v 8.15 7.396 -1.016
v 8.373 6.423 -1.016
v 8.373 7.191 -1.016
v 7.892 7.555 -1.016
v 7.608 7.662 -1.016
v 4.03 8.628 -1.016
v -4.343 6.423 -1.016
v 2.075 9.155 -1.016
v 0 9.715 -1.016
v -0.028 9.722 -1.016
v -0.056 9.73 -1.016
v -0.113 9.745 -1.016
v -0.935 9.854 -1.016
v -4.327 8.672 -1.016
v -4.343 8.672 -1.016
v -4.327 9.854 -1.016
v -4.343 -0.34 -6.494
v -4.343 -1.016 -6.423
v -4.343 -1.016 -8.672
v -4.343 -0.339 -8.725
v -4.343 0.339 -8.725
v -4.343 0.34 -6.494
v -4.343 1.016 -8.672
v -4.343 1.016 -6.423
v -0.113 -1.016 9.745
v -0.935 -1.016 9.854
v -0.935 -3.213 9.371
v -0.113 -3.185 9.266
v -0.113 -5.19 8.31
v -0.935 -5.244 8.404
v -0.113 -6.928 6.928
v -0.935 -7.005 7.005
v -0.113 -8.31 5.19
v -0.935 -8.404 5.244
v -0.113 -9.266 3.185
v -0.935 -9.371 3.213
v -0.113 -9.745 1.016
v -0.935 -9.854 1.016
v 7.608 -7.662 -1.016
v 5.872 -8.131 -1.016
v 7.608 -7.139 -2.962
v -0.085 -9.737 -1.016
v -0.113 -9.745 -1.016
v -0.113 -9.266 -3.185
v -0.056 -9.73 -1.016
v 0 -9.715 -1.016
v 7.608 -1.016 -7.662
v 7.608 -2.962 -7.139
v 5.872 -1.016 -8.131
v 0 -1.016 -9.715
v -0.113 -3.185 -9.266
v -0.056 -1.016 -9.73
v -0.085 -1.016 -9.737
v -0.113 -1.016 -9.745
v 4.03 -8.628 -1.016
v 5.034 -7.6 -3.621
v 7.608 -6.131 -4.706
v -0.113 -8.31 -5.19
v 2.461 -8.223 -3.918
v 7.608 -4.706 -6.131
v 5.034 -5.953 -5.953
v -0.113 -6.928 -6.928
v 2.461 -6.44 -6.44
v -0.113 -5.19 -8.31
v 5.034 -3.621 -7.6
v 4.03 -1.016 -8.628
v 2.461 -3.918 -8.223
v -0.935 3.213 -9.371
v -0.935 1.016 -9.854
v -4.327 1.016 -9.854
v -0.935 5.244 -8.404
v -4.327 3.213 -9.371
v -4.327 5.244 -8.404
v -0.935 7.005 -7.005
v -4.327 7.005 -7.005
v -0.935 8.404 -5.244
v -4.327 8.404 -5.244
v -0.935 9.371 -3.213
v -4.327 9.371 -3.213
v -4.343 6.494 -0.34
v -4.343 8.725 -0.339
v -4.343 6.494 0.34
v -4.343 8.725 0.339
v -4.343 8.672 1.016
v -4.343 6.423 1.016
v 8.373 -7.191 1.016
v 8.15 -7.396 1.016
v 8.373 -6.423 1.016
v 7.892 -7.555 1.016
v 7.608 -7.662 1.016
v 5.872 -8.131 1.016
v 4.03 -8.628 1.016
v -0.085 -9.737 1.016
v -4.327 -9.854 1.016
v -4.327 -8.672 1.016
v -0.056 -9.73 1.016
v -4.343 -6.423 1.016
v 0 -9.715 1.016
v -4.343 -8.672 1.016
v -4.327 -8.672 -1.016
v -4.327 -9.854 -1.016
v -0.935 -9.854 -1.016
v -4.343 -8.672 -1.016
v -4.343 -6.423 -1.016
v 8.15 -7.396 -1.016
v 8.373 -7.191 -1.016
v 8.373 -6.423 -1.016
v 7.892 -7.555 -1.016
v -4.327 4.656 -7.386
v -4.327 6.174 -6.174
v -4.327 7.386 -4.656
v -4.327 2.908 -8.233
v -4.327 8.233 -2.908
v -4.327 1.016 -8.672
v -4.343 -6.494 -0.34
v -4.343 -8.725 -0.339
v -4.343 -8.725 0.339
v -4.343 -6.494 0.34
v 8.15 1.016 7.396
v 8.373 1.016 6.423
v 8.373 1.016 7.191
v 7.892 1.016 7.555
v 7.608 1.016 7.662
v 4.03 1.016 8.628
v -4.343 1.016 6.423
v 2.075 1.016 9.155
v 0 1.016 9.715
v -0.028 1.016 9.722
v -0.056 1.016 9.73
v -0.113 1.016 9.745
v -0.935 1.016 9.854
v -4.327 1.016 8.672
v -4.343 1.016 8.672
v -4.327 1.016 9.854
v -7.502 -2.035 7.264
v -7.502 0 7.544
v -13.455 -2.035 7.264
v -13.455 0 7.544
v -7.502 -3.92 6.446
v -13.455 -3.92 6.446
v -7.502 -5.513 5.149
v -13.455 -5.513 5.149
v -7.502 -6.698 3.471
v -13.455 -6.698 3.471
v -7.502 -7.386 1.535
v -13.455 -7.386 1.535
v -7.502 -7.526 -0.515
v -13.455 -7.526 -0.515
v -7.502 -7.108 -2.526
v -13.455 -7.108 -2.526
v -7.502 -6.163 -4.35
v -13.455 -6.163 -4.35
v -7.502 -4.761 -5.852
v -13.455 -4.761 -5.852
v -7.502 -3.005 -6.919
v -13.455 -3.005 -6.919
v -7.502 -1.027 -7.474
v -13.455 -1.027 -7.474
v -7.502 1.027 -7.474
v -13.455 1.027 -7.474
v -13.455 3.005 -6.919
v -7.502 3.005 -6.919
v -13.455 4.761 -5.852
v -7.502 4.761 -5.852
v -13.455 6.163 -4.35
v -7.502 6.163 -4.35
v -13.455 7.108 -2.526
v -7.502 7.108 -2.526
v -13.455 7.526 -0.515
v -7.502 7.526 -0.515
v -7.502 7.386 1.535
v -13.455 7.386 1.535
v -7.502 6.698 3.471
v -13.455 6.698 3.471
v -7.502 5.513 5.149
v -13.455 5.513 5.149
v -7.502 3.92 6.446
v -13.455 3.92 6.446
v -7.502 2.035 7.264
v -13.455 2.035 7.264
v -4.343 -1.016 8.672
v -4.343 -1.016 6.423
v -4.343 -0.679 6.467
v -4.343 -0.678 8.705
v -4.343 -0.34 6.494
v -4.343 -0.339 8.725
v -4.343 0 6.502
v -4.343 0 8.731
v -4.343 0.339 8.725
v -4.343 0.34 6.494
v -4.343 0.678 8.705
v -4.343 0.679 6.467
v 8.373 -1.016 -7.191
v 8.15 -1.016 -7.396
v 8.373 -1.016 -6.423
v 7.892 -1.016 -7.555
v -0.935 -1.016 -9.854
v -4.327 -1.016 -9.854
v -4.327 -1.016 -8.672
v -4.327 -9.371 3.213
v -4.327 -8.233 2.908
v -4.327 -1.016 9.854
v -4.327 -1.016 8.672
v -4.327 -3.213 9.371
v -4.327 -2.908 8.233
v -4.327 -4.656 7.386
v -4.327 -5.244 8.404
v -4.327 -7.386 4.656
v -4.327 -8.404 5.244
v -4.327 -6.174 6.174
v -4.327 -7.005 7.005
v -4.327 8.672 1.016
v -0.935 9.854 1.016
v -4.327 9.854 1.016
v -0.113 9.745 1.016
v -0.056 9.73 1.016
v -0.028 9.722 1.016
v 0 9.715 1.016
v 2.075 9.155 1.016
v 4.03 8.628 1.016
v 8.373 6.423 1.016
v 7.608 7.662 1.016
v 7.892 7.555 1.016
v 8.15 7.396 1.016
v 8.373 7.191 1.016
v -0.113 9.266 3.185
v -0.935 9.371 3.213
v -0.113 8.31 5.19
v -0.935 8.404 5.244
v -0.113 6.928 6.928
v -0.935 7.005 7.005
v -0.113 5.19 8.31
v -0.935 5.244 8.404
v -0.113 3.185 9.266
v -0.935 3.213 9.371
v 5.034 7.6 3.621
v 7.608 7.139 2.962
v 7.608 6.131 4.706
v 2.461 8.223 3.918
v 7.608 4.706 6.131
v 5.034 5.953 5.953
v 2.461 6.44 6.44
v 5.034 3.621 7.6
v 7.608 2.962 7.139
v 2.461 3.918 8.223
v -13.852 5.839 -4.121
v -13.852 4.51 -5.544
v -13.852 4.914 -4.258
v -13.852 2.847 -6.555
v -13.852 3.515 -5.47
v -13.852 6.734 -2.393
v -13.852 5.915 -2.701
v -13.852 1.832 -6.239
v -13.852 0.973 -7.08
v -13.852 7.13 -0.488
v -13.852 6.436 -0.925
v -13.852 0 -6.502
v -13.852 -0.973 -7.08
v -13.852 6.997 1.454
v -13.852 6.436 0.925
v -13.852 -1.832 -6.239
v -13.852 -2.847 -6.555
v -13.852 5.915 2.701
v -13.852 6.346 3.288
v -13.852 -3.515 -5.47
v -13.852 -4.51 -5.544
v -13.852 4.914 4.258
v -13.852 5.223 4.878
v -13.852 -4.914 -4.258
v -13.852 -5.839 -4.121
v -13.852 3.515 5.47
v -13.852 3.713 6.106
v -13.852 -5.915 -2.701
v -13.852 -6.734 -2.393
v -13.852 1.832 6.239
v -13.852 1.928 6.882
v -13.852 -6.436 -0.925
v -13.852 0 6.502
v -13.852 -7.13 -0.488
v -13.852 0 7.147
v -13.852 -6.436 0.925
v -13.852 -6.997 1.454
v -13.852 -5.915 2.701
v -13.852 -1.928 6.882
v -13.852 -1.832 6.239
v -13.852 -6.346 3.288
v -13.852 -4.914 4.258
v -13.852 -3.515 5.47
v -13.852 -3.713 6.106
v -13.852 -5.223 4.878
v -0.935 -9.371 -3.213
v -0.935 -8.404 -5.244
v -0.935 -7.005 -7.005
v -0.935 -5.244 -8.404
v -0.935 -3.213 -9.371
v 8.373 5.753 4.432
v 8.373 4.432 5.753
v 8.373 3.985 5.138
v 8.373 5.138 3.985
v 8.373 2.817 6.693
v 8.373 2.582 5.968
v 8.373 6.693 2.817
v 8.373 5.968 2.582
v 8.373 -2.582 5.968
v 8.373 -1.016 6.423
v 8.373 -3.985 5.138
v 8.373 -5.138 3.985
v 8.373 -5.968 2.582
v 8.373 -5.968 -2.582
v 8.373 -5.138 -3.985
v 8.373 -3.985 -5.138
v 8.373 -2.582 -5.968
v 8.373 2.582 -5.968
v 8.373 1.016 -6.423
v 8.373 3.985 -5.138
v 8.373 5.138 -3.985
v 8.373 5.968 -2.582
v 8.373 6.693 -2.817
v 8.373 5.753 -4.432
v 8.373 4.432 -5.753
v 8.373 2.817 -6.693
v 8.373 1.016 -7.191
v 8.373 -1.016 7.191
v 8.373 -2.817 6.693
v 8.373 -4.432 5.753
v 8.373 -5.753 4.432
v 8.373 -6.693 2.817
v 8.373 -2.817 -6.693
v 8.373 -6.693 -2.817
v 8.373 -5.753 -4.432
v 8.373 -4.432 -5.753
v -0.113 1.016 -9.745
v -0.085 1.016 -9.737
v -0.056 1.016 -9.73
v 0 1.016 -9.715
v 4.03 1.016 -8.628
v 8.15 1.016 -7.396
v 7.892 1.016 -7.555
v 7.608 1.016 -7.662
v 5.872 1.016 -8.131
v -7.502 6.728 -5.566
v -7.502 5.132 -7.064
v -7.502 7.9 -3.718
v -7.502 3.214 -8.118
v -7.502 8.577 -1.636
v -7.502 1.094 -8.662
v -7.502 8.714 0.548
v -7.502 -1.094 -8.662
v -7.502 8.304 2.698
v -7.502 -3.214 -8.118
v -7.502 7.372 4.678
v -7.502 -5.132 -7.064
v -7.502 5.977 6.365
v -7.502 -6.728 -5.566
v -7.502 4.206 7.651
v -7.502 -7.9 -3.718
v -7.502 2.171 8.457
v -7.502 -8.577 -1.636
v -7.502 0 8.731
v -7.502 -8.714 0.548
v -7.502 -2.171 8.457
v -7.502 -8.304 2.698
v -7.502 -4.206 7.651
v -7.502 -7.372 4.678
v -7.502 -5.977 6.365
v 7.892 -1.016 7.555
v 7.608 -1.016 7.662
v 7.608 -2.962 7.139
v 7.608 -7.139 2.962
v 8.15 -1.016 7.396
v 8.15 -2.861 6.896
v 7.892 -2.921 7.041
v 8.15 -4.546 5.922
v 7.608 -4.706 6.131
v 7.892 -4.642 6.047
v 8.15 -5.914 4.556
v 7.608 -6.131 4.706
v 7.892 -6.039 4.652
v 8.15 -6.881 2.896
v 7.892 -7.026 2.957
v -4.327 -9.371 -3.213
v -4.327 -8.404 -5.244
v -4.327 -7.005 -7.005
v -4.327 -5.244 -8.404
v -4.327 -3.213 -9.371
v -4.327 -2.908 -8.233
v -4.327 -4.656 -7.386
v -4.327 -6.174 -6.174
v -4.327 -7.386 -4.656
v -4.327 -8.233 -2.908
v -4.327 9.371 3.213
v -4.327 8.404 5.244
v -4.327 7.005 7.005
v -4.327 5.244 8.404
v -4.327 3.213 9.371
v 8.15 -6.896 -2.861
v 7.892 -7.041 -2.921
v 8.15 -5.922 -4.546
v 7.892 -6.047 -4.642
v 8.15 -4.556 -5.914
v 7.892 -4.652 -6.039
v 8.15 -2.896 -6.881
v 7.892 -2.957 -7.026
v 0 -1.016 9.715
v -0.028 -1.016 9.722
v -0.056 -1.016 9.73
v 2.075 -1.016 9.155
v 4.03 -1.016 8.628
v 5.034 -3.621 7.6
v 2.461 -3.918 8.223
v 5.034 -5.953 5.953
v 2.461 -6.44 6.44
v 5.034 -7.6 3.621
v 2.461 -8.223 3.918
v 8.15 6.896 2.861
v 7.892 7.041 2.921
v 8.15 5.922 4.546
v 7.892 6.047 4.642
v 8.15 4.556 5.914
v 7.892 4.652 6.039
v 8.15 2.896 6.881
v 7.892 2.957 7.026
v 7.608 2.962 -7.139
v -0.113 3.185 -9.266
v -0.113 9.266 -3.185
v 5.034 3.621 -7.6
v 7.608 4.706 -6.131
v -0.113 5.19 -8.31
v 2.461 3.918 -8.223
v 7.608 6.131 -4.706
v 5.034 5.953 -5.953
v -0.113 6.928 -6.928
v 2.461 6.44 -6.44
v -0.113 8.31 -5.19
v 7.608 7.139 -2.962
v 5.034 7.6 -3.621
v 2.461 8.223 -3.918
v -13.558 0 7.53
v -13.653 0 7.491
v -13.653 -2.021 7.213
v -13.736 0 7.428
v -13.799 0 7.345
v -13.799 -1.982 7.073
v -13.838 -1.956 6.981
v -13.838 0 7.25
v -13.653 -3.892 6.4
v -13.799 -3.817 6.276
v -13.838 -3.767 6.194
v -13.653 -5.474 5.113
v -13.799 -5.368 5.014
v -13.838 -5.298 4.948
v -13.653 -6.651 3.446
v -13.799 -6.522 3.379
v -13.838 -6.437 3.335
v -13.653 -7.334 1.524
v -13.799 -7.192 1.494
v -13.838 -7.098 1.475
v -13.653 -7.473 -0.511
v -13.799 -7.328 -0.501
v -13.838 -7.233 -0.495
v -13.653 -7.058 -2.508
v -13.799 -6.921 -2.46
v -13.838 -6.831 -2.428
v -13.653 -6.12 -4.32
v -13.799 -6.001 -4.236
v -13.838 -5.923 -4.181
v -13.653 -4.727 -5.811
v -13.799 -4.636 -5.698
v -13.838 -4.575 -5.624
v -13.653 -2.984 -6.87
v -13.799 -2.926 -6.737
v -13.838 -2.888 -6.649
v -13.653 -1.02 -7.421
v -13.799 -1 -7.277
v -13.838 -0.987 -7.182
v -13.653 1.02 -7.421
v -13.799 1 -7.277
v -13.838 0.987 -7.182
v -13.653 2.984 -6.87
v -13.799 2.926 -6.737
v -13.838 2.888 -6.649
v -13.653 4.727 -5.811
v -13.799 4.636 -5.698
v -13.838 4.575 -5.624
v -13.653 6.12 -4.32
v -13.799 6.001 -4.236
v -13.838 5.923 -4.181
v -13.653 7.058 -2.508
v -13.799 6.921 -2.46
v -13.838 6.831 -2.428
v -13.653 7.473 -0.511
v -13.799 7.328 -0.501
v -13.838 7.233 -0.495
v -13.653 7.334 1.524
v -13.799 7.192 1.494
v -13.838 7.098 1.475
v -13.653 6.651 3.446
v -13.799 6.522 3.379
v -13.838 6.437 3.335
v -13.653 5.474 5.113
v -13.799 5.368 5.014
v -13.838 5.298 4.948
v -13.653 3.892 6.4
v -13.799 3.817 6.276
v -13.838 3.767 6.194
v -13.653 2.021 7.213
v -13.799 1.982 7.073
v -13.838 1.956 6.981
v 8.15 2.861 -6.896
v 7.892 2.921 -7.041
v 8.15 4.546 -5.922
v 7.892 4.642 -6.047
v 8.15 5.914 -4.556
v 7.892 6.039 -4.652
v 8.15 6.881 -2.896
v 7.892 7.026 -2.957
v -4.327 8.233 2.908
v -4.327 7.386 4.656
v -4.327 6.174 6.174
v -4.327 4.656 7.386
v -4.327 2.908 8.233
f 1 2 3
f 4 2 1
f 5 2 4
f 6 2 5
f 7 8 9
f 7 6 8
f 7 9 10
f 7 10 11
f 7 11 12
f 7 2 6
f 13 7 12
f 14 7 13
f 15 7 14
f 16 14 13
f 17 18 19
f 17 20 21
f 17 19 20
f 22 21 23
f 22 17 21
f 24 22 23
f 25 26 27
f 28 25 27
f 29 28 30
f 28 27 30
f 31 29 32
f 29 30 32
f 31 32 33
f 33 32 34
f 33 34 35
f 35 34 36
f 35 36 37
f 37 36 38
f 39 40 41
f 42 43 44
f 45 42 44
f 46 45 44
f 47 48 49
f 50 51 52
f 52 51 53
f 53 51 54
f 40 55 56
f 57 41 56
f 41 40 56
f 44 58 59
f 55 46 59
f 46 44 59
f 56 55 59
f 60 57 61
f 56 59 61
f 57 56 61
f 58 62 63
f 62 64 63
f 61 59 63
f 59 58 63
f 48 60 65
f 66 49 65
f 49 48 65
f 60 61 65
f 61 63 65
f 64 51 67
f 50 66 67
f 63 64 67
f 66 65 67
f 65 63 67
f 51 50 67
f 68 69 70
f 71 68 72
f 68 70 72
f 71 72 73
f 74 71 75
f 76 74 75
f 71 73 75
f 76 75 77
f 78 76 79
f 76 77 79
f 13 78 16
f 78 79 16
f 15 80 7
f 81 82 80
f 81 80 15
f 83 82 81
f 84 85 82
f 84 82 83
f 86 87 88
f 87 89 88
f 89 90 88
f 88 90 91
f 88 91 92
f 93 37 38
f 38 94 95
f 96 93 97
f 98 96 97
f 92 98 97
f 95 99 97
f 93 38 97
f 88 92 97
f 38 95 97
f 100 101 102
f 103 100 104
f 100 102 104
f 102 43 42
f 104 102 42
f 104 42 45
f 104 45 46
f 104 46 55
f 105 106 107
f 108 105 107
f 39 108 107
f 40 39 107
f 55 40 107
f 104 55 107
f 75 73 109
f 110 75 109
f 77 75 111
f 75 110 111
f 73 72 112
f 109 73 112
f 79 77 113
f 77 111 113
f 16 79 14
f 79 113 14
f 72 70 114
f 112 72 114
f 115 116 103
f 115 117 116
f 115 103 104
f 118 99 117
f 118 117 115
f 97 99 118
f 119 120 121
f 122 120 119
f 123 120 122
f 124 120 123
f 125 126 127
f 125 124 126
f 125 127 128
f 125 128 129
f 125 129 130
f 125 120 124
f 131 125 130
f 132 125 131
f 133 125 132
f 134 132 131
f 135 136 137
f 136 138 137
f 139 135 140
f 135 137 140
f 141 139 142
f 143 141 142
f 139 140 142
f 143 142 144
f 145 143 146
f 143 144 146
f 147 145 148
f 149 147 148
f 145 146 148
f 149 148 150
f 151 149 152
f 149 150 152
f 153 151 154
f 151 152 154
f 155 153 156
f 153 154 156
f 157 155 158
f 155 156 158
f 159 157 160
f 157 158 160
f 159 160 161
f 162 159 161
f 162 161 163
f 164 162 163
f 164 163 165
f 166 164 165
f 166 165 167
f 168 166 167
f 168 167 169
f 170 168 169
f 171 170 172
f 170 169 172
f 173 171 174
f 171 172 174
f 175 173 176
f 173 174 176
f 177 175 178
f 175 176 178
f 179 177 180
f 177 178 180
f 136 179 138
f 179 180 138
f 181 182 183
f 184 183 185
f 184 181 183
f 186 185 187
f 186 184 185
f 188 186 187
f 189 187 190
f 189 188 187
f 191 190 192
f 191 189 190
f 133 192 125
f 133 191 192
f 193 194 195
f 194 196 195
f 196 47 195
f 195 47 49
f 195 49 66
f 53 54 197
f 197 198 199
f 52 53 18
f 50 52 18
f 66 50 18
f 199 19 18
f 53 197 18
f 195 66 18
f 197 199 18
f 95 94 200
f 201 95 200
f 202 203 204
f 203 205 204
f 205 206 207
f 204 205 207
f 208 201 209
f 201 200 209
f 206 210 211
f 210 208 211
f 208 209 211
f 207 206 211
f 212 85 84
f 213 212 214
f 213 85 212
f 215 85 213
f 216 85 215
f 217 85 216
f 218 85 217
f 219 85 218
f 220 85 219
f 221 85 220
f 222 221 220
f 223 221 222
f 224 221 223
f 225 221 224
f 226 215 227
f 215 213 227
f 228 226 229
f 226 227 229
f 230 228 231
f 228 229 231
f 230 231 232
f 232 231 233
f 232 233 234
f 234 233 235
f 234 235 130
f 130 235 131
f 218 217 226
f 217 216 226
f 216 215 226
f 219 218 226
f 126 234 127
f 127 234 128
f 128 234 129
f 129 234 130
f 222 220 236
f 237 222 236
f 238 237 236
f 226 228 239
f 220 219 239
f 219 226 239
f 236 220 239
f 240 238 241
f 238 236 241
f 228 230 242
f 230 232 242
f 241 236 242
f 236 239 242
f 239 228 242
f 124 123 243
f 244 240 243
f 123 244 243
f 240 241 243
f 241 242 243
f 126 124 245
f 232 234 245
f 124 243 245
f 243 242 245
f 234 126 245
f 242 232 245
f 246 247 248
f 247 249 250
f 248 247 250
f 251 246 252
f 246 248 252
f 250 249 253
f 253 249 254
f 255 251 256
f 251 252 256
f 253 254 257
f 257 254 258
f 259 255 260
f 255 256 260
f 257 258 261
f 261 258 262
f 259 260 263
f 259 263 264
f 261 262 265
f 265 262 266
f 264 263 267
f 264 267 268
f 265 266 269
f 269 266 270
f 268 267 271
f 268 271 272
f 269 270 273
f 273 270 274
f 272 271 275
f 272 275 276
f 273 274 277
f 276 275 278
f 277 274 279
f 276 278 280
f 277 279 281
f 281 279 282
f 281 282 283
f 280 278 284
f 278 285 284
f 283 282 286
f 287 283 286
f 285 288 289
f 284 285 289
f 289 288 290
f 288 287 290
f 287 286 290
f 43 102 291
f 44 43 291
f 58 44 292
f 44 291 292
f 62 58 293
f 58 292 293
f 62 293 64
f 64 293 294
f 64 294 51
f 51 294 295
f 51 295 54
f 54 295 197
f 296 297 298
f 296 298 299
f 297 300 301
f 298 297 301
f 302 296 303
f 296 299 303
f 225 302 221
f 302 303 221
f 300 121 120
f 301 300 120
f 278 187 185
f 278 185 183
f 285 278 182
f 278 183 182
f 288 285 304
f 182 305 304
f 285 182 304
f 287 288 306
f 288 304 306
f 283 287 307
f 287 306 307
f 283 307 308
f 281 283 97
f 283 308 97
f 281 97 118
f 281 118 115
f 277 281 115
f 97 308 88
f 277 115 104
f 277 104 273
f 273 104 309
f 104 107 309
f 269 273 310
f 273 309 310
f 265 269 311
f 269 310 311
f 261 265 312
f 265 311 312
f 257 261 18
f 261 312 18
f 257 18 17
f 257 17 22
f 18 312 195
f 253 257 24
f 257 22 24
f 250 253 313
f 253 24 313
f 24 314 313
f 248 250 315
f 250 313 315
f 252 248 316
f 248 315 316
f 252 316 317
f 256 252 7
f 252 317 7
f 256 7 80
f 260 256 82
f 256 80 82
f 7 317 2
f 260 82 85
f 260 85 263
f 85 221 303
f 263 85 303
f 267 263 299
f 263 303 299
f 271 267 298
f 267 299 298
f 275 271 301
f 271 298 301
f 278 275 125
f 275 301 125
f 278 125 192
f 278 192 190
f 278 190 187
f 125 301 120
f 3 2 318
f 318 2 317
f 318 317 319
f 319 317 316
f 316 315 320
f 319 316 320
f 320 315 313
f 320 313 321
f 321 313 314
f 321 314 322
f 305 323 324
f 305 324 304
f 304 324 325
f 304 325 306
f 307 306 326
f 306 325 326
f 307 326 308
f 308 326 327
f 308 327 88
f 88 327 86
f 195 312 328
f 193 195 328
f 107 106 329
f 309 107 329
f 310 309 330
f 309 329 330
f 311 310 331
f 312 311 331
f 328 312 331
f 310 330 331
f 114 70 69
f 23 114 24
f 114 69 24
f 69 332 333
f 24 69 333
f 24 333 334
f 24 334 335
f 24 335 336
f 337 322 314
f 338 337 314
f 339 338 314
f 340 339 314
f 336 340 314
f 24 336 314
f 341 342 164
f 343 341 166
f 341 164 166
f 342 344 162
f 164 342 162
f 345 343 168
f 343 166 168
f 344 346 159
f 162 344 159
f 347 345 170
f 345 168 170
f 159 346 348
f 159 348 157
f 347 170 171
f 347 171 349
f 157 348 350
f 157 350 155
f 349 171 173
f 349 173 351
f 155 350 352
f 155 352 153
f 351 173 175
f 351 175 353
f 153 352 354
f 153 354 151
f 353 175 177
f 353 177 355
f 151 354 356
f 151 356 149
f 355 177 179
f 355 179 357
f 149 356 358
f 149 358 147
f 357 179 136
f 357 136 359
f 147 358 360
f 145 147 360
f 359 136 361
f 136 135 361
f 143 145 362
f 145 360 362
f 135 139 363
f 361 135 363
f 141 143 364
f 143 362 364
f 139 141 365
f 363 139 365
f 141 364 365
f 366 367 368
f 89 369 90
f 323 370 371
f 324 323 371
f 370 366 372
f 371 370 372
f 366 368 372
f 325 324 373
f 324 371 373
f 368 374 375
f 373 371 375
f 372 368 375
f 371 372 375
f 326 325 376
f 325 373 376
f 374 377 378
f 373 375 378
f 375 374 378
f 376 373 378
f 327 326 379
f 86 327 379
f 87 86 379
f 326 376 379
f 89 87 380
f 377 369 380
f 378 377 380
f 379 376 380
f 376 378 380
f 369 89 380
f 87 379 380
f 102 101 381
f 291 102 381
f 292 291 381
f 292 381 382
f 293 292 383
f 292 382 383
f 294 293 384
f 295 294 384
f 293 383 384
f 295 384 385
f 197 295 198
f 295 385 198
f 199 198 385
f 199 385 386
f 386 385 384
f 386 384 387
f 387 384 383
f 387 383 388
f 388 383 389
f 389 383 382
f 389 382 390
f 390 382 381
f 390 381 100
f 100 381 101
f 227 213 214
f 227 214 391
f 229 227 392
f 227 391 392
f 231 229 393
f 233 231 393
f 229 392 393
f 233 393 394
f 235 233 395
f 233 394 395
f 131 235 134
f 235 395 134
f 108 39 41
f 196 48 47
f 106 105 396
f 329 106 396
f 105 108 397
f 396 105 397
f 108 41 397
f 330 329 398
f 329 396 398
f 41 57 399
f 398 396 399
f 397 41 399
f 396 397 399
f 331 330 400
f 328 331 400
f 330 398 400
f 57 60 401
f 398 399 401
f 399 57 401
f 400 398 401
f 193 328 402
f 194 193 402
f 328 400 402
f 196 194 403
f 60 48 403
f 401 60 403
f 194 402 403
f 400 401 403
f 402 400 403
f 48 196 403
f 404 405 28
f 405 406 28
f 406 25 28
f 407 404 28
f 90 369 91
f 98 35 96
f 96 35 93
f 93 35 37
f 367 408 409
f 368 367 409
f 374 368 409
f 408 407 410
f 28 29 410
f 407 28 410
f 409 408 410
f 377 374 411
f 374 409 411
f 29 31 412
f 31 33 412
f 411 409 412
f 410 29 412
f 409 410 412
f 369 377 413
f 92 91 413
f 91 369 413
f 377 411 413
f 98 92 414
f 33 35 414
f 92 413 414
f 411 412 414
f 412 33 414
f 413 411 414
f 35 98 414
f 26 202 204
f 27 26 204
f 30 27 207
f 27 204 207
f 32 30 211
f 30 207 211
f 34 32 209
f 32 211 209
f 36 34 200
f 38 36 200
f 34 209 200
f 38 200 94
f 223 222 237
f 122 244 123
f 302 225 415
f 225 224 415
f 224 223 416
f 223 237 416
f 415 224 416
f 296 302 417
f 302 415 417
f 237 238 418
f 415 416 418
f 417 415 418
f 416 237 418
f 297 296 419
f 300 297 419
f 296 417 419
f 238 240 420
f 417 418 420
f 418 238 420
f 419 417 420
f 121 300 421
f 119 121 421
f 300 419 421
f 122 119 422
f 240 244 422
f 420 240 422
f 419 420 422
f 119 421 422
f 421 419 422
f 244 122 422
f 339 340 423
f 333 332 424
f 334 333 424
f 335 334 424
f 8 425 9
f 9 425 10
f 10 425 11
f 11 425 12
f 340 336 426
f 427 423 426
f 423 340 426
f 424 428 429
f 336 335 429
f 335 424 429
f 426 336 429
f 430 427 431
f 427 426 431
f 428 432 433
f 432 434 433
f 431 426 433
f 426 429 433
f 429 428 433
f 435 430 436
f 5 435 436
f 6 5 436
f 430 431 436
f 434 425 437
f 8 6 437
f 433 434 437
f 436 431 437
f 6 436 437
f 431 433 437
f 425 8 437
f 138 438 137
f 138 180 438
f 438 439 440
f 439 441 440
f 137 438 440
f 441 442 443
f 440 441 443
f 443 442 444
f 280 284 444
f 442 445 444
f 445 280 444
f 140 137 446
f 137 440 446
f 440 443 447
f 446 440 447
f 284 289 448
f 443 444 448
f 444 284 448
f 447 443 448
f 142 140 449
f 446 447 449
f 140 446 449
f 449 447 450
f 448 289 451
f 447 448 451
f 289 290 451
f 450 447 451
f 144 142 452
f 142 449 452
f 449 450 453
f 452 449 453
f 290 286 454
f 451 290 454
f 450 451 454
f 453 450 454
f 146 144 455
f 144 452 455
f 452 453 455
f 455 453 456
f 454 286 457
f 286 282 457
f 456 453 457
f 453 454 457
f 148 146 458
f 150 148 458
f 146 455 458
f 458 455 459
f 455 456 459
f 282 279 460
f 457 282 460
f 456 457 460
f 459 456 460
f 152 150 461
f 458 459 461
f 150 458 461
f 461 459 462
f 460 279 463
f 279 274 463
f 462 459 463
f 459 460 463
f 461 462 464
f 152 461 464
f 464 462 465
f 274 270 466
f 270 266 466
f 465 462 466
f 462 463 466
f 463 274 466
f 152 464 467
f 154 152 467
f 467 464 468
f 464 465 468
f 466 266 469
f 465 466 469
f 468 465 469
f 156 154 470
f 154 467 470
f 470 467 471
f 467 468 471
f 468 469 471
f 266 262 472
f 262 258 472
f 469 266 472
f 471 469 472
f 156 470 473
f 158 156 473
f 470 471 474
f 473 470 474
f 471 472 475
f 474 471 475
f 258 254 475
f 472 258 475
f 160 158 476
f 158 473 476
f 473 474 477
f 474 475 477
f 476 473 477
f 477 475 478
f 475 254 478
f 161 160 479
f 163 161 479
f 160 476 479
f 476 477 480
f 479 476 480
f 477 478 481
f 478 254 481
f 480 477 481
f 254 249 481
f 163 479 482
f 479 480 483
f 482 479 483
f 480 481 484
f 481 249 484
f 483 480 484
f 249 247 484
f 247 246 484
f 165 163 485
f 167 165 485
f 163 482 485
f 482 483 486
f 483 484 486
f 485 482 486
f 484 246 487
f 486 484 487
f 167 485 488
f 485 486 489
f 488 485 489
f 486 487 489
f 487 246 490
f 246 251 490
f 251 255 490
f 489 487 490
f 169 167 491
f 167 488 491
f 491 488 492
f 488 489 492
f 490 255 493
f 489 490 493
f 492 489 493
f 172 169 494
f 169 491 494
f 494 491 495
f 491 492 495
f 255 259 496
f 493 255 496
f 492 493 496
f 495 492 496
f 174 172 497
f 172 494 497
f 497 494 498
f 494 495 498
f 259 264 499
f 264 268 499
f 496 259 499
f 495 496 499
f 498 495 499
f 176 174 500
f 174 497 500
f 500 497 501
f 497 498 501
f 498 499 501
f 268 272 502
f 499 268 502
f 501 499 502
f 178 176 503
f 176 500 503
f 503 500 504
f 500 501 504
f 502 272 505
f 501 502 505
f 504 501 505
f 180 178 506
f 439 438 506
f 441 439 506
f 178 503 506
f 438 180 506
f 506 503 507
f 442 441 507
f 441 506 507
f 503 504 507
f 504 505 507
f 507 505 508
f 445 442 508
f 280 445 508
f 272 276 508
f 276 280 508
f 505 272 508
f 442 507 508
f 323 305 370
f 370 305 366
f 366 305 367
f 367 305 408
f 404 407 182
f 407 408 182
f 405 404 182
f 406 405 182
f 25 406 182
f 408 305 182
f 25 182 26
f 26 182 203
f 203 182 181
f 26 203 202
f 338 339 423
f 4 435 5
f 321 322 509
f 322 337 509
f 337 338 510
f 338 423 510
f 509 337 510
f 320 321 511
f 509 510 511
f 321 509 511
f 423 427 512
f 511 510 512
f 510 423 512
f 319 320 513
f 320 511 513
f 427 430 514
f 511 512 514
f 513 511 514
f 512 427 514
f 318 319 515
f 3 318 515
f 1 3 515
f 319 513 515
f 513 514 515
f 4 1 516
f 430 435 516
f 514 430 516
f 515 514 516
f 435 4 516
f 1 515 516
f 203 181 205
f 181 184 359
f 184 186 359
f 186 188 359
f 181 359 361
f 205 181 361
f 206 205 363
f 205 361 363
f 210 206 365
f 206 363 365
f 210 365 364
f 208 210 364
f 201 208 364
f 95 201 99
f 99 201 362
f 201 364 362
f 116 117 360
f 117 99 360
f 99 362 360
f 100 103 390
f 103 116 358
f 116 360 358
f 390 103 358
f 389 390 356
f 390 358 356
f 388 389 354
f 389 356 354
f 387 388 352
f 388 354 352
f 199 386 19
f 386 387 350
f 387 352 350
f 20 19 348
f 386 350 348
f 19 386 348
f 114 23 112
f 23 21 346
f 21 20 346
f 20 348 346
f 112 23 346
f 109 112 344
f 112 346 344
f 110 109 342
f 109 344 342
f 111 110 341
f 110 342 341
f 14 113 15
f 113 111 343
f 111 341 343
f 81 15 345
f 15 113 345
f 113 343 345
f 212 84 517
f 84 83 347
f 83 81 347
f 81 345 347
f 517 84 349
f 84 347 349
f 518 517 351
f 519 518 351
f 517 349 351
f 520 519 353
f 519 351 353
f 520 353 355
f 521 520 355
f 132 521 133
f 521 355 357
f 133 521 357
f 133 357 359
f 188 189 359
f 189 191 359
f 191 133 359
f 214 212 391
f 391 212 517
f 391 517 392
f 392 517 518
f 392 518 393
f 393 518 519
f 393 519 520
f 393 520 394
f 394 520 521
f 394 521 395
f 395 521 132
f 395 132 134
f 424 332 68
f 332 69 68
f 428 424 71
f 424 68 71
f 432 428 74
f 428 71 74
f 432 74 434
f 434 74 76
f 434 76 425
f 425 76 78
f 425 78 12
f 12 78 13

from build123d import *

# Parameters (mm, degrees)
F2_W          = 2.032
F2_H          = 3.556
F2_W_2        = 3.556
F2_H_2        = 2.032
F3_DEPTH      = 25.4
F3_DEPTH_BACK = 4.3434


# Not quite as in the source:
# - a feature names something its author has since deleted; it is built from what else it names


with BuildPart() as f1:
    # F0 (on Front) → F1 (revolve)
    with BuildSketch(Plane.XZ):
        with BuildLine():
            ThreePointArc((8.3732076521, 7.2620277332), (8.0243377529, 7.5505761386), (7.608205325, 7.728913435))
            Line((7.608205325, 7.728913435), (-0.1130385595, 9.7978144985))
            ThreePointArc((-0.1130385595, 9.7978144985), (-0.5203683675, 9.8788374349), (-0.9347890277, 9.906))
            Line((-0.9347890277, 9.906), (-4.3267923479, 9.906))
            Line((-4.3267923479, 9.906), (-4.3267923479, 8.73125))
            Line((-4.3267923479, 8.73125), (-7.5017923479, 8.73125))
            Line((-7.5017923479, 8.73125), (-7.5017923479, 7.5438))
            Line((-7.5017923479, 7.5438), (-13.4549173479, 7.5438))
            ThreePointArc((-13.4549173479, 7.5438), (-13.7355503517, 7.4275580038), (-13.8517923479, 7.146925))
            Line((-13.8517923479, 7.146925), (-13.8517923479, 6.5024))
            Line((-13.8517923479, 6.5024), (8.3732076521, 6.5024))
            Line((8.3732076521, 6.5024), (8.3732076521, 7.2620277332))
        make_face()
    revolve(axis=Axis((-0.2325048039, 0, 0), (1, 0, 0)))

    # F2 (on Right) → F3 (cut, two sides)
    with BuildSketch(Plane.YZ) as f3_sk:
        with Locations((0, -8.1534)):
            Rectangle(F2_W, F2_H)
        with Locations((0, 8.1534)):
            Rectangle(F2_W, F2_H)
        with Locations((-8.1534, 0)):
            Rectangle(F2_W_2, F2_H_2)
        with Locations((8.1534, 0)):
            Rectangle(F2_W_2, F2_H_2)
    extrude(amount=F3_DEPTH, mode=Mode.SUBTRACT)
    extrude(f3_sk.sketch, amount=-F3_DEPTH_BACK, mode=Mode.SUBTRACT)


solid = f1.part
